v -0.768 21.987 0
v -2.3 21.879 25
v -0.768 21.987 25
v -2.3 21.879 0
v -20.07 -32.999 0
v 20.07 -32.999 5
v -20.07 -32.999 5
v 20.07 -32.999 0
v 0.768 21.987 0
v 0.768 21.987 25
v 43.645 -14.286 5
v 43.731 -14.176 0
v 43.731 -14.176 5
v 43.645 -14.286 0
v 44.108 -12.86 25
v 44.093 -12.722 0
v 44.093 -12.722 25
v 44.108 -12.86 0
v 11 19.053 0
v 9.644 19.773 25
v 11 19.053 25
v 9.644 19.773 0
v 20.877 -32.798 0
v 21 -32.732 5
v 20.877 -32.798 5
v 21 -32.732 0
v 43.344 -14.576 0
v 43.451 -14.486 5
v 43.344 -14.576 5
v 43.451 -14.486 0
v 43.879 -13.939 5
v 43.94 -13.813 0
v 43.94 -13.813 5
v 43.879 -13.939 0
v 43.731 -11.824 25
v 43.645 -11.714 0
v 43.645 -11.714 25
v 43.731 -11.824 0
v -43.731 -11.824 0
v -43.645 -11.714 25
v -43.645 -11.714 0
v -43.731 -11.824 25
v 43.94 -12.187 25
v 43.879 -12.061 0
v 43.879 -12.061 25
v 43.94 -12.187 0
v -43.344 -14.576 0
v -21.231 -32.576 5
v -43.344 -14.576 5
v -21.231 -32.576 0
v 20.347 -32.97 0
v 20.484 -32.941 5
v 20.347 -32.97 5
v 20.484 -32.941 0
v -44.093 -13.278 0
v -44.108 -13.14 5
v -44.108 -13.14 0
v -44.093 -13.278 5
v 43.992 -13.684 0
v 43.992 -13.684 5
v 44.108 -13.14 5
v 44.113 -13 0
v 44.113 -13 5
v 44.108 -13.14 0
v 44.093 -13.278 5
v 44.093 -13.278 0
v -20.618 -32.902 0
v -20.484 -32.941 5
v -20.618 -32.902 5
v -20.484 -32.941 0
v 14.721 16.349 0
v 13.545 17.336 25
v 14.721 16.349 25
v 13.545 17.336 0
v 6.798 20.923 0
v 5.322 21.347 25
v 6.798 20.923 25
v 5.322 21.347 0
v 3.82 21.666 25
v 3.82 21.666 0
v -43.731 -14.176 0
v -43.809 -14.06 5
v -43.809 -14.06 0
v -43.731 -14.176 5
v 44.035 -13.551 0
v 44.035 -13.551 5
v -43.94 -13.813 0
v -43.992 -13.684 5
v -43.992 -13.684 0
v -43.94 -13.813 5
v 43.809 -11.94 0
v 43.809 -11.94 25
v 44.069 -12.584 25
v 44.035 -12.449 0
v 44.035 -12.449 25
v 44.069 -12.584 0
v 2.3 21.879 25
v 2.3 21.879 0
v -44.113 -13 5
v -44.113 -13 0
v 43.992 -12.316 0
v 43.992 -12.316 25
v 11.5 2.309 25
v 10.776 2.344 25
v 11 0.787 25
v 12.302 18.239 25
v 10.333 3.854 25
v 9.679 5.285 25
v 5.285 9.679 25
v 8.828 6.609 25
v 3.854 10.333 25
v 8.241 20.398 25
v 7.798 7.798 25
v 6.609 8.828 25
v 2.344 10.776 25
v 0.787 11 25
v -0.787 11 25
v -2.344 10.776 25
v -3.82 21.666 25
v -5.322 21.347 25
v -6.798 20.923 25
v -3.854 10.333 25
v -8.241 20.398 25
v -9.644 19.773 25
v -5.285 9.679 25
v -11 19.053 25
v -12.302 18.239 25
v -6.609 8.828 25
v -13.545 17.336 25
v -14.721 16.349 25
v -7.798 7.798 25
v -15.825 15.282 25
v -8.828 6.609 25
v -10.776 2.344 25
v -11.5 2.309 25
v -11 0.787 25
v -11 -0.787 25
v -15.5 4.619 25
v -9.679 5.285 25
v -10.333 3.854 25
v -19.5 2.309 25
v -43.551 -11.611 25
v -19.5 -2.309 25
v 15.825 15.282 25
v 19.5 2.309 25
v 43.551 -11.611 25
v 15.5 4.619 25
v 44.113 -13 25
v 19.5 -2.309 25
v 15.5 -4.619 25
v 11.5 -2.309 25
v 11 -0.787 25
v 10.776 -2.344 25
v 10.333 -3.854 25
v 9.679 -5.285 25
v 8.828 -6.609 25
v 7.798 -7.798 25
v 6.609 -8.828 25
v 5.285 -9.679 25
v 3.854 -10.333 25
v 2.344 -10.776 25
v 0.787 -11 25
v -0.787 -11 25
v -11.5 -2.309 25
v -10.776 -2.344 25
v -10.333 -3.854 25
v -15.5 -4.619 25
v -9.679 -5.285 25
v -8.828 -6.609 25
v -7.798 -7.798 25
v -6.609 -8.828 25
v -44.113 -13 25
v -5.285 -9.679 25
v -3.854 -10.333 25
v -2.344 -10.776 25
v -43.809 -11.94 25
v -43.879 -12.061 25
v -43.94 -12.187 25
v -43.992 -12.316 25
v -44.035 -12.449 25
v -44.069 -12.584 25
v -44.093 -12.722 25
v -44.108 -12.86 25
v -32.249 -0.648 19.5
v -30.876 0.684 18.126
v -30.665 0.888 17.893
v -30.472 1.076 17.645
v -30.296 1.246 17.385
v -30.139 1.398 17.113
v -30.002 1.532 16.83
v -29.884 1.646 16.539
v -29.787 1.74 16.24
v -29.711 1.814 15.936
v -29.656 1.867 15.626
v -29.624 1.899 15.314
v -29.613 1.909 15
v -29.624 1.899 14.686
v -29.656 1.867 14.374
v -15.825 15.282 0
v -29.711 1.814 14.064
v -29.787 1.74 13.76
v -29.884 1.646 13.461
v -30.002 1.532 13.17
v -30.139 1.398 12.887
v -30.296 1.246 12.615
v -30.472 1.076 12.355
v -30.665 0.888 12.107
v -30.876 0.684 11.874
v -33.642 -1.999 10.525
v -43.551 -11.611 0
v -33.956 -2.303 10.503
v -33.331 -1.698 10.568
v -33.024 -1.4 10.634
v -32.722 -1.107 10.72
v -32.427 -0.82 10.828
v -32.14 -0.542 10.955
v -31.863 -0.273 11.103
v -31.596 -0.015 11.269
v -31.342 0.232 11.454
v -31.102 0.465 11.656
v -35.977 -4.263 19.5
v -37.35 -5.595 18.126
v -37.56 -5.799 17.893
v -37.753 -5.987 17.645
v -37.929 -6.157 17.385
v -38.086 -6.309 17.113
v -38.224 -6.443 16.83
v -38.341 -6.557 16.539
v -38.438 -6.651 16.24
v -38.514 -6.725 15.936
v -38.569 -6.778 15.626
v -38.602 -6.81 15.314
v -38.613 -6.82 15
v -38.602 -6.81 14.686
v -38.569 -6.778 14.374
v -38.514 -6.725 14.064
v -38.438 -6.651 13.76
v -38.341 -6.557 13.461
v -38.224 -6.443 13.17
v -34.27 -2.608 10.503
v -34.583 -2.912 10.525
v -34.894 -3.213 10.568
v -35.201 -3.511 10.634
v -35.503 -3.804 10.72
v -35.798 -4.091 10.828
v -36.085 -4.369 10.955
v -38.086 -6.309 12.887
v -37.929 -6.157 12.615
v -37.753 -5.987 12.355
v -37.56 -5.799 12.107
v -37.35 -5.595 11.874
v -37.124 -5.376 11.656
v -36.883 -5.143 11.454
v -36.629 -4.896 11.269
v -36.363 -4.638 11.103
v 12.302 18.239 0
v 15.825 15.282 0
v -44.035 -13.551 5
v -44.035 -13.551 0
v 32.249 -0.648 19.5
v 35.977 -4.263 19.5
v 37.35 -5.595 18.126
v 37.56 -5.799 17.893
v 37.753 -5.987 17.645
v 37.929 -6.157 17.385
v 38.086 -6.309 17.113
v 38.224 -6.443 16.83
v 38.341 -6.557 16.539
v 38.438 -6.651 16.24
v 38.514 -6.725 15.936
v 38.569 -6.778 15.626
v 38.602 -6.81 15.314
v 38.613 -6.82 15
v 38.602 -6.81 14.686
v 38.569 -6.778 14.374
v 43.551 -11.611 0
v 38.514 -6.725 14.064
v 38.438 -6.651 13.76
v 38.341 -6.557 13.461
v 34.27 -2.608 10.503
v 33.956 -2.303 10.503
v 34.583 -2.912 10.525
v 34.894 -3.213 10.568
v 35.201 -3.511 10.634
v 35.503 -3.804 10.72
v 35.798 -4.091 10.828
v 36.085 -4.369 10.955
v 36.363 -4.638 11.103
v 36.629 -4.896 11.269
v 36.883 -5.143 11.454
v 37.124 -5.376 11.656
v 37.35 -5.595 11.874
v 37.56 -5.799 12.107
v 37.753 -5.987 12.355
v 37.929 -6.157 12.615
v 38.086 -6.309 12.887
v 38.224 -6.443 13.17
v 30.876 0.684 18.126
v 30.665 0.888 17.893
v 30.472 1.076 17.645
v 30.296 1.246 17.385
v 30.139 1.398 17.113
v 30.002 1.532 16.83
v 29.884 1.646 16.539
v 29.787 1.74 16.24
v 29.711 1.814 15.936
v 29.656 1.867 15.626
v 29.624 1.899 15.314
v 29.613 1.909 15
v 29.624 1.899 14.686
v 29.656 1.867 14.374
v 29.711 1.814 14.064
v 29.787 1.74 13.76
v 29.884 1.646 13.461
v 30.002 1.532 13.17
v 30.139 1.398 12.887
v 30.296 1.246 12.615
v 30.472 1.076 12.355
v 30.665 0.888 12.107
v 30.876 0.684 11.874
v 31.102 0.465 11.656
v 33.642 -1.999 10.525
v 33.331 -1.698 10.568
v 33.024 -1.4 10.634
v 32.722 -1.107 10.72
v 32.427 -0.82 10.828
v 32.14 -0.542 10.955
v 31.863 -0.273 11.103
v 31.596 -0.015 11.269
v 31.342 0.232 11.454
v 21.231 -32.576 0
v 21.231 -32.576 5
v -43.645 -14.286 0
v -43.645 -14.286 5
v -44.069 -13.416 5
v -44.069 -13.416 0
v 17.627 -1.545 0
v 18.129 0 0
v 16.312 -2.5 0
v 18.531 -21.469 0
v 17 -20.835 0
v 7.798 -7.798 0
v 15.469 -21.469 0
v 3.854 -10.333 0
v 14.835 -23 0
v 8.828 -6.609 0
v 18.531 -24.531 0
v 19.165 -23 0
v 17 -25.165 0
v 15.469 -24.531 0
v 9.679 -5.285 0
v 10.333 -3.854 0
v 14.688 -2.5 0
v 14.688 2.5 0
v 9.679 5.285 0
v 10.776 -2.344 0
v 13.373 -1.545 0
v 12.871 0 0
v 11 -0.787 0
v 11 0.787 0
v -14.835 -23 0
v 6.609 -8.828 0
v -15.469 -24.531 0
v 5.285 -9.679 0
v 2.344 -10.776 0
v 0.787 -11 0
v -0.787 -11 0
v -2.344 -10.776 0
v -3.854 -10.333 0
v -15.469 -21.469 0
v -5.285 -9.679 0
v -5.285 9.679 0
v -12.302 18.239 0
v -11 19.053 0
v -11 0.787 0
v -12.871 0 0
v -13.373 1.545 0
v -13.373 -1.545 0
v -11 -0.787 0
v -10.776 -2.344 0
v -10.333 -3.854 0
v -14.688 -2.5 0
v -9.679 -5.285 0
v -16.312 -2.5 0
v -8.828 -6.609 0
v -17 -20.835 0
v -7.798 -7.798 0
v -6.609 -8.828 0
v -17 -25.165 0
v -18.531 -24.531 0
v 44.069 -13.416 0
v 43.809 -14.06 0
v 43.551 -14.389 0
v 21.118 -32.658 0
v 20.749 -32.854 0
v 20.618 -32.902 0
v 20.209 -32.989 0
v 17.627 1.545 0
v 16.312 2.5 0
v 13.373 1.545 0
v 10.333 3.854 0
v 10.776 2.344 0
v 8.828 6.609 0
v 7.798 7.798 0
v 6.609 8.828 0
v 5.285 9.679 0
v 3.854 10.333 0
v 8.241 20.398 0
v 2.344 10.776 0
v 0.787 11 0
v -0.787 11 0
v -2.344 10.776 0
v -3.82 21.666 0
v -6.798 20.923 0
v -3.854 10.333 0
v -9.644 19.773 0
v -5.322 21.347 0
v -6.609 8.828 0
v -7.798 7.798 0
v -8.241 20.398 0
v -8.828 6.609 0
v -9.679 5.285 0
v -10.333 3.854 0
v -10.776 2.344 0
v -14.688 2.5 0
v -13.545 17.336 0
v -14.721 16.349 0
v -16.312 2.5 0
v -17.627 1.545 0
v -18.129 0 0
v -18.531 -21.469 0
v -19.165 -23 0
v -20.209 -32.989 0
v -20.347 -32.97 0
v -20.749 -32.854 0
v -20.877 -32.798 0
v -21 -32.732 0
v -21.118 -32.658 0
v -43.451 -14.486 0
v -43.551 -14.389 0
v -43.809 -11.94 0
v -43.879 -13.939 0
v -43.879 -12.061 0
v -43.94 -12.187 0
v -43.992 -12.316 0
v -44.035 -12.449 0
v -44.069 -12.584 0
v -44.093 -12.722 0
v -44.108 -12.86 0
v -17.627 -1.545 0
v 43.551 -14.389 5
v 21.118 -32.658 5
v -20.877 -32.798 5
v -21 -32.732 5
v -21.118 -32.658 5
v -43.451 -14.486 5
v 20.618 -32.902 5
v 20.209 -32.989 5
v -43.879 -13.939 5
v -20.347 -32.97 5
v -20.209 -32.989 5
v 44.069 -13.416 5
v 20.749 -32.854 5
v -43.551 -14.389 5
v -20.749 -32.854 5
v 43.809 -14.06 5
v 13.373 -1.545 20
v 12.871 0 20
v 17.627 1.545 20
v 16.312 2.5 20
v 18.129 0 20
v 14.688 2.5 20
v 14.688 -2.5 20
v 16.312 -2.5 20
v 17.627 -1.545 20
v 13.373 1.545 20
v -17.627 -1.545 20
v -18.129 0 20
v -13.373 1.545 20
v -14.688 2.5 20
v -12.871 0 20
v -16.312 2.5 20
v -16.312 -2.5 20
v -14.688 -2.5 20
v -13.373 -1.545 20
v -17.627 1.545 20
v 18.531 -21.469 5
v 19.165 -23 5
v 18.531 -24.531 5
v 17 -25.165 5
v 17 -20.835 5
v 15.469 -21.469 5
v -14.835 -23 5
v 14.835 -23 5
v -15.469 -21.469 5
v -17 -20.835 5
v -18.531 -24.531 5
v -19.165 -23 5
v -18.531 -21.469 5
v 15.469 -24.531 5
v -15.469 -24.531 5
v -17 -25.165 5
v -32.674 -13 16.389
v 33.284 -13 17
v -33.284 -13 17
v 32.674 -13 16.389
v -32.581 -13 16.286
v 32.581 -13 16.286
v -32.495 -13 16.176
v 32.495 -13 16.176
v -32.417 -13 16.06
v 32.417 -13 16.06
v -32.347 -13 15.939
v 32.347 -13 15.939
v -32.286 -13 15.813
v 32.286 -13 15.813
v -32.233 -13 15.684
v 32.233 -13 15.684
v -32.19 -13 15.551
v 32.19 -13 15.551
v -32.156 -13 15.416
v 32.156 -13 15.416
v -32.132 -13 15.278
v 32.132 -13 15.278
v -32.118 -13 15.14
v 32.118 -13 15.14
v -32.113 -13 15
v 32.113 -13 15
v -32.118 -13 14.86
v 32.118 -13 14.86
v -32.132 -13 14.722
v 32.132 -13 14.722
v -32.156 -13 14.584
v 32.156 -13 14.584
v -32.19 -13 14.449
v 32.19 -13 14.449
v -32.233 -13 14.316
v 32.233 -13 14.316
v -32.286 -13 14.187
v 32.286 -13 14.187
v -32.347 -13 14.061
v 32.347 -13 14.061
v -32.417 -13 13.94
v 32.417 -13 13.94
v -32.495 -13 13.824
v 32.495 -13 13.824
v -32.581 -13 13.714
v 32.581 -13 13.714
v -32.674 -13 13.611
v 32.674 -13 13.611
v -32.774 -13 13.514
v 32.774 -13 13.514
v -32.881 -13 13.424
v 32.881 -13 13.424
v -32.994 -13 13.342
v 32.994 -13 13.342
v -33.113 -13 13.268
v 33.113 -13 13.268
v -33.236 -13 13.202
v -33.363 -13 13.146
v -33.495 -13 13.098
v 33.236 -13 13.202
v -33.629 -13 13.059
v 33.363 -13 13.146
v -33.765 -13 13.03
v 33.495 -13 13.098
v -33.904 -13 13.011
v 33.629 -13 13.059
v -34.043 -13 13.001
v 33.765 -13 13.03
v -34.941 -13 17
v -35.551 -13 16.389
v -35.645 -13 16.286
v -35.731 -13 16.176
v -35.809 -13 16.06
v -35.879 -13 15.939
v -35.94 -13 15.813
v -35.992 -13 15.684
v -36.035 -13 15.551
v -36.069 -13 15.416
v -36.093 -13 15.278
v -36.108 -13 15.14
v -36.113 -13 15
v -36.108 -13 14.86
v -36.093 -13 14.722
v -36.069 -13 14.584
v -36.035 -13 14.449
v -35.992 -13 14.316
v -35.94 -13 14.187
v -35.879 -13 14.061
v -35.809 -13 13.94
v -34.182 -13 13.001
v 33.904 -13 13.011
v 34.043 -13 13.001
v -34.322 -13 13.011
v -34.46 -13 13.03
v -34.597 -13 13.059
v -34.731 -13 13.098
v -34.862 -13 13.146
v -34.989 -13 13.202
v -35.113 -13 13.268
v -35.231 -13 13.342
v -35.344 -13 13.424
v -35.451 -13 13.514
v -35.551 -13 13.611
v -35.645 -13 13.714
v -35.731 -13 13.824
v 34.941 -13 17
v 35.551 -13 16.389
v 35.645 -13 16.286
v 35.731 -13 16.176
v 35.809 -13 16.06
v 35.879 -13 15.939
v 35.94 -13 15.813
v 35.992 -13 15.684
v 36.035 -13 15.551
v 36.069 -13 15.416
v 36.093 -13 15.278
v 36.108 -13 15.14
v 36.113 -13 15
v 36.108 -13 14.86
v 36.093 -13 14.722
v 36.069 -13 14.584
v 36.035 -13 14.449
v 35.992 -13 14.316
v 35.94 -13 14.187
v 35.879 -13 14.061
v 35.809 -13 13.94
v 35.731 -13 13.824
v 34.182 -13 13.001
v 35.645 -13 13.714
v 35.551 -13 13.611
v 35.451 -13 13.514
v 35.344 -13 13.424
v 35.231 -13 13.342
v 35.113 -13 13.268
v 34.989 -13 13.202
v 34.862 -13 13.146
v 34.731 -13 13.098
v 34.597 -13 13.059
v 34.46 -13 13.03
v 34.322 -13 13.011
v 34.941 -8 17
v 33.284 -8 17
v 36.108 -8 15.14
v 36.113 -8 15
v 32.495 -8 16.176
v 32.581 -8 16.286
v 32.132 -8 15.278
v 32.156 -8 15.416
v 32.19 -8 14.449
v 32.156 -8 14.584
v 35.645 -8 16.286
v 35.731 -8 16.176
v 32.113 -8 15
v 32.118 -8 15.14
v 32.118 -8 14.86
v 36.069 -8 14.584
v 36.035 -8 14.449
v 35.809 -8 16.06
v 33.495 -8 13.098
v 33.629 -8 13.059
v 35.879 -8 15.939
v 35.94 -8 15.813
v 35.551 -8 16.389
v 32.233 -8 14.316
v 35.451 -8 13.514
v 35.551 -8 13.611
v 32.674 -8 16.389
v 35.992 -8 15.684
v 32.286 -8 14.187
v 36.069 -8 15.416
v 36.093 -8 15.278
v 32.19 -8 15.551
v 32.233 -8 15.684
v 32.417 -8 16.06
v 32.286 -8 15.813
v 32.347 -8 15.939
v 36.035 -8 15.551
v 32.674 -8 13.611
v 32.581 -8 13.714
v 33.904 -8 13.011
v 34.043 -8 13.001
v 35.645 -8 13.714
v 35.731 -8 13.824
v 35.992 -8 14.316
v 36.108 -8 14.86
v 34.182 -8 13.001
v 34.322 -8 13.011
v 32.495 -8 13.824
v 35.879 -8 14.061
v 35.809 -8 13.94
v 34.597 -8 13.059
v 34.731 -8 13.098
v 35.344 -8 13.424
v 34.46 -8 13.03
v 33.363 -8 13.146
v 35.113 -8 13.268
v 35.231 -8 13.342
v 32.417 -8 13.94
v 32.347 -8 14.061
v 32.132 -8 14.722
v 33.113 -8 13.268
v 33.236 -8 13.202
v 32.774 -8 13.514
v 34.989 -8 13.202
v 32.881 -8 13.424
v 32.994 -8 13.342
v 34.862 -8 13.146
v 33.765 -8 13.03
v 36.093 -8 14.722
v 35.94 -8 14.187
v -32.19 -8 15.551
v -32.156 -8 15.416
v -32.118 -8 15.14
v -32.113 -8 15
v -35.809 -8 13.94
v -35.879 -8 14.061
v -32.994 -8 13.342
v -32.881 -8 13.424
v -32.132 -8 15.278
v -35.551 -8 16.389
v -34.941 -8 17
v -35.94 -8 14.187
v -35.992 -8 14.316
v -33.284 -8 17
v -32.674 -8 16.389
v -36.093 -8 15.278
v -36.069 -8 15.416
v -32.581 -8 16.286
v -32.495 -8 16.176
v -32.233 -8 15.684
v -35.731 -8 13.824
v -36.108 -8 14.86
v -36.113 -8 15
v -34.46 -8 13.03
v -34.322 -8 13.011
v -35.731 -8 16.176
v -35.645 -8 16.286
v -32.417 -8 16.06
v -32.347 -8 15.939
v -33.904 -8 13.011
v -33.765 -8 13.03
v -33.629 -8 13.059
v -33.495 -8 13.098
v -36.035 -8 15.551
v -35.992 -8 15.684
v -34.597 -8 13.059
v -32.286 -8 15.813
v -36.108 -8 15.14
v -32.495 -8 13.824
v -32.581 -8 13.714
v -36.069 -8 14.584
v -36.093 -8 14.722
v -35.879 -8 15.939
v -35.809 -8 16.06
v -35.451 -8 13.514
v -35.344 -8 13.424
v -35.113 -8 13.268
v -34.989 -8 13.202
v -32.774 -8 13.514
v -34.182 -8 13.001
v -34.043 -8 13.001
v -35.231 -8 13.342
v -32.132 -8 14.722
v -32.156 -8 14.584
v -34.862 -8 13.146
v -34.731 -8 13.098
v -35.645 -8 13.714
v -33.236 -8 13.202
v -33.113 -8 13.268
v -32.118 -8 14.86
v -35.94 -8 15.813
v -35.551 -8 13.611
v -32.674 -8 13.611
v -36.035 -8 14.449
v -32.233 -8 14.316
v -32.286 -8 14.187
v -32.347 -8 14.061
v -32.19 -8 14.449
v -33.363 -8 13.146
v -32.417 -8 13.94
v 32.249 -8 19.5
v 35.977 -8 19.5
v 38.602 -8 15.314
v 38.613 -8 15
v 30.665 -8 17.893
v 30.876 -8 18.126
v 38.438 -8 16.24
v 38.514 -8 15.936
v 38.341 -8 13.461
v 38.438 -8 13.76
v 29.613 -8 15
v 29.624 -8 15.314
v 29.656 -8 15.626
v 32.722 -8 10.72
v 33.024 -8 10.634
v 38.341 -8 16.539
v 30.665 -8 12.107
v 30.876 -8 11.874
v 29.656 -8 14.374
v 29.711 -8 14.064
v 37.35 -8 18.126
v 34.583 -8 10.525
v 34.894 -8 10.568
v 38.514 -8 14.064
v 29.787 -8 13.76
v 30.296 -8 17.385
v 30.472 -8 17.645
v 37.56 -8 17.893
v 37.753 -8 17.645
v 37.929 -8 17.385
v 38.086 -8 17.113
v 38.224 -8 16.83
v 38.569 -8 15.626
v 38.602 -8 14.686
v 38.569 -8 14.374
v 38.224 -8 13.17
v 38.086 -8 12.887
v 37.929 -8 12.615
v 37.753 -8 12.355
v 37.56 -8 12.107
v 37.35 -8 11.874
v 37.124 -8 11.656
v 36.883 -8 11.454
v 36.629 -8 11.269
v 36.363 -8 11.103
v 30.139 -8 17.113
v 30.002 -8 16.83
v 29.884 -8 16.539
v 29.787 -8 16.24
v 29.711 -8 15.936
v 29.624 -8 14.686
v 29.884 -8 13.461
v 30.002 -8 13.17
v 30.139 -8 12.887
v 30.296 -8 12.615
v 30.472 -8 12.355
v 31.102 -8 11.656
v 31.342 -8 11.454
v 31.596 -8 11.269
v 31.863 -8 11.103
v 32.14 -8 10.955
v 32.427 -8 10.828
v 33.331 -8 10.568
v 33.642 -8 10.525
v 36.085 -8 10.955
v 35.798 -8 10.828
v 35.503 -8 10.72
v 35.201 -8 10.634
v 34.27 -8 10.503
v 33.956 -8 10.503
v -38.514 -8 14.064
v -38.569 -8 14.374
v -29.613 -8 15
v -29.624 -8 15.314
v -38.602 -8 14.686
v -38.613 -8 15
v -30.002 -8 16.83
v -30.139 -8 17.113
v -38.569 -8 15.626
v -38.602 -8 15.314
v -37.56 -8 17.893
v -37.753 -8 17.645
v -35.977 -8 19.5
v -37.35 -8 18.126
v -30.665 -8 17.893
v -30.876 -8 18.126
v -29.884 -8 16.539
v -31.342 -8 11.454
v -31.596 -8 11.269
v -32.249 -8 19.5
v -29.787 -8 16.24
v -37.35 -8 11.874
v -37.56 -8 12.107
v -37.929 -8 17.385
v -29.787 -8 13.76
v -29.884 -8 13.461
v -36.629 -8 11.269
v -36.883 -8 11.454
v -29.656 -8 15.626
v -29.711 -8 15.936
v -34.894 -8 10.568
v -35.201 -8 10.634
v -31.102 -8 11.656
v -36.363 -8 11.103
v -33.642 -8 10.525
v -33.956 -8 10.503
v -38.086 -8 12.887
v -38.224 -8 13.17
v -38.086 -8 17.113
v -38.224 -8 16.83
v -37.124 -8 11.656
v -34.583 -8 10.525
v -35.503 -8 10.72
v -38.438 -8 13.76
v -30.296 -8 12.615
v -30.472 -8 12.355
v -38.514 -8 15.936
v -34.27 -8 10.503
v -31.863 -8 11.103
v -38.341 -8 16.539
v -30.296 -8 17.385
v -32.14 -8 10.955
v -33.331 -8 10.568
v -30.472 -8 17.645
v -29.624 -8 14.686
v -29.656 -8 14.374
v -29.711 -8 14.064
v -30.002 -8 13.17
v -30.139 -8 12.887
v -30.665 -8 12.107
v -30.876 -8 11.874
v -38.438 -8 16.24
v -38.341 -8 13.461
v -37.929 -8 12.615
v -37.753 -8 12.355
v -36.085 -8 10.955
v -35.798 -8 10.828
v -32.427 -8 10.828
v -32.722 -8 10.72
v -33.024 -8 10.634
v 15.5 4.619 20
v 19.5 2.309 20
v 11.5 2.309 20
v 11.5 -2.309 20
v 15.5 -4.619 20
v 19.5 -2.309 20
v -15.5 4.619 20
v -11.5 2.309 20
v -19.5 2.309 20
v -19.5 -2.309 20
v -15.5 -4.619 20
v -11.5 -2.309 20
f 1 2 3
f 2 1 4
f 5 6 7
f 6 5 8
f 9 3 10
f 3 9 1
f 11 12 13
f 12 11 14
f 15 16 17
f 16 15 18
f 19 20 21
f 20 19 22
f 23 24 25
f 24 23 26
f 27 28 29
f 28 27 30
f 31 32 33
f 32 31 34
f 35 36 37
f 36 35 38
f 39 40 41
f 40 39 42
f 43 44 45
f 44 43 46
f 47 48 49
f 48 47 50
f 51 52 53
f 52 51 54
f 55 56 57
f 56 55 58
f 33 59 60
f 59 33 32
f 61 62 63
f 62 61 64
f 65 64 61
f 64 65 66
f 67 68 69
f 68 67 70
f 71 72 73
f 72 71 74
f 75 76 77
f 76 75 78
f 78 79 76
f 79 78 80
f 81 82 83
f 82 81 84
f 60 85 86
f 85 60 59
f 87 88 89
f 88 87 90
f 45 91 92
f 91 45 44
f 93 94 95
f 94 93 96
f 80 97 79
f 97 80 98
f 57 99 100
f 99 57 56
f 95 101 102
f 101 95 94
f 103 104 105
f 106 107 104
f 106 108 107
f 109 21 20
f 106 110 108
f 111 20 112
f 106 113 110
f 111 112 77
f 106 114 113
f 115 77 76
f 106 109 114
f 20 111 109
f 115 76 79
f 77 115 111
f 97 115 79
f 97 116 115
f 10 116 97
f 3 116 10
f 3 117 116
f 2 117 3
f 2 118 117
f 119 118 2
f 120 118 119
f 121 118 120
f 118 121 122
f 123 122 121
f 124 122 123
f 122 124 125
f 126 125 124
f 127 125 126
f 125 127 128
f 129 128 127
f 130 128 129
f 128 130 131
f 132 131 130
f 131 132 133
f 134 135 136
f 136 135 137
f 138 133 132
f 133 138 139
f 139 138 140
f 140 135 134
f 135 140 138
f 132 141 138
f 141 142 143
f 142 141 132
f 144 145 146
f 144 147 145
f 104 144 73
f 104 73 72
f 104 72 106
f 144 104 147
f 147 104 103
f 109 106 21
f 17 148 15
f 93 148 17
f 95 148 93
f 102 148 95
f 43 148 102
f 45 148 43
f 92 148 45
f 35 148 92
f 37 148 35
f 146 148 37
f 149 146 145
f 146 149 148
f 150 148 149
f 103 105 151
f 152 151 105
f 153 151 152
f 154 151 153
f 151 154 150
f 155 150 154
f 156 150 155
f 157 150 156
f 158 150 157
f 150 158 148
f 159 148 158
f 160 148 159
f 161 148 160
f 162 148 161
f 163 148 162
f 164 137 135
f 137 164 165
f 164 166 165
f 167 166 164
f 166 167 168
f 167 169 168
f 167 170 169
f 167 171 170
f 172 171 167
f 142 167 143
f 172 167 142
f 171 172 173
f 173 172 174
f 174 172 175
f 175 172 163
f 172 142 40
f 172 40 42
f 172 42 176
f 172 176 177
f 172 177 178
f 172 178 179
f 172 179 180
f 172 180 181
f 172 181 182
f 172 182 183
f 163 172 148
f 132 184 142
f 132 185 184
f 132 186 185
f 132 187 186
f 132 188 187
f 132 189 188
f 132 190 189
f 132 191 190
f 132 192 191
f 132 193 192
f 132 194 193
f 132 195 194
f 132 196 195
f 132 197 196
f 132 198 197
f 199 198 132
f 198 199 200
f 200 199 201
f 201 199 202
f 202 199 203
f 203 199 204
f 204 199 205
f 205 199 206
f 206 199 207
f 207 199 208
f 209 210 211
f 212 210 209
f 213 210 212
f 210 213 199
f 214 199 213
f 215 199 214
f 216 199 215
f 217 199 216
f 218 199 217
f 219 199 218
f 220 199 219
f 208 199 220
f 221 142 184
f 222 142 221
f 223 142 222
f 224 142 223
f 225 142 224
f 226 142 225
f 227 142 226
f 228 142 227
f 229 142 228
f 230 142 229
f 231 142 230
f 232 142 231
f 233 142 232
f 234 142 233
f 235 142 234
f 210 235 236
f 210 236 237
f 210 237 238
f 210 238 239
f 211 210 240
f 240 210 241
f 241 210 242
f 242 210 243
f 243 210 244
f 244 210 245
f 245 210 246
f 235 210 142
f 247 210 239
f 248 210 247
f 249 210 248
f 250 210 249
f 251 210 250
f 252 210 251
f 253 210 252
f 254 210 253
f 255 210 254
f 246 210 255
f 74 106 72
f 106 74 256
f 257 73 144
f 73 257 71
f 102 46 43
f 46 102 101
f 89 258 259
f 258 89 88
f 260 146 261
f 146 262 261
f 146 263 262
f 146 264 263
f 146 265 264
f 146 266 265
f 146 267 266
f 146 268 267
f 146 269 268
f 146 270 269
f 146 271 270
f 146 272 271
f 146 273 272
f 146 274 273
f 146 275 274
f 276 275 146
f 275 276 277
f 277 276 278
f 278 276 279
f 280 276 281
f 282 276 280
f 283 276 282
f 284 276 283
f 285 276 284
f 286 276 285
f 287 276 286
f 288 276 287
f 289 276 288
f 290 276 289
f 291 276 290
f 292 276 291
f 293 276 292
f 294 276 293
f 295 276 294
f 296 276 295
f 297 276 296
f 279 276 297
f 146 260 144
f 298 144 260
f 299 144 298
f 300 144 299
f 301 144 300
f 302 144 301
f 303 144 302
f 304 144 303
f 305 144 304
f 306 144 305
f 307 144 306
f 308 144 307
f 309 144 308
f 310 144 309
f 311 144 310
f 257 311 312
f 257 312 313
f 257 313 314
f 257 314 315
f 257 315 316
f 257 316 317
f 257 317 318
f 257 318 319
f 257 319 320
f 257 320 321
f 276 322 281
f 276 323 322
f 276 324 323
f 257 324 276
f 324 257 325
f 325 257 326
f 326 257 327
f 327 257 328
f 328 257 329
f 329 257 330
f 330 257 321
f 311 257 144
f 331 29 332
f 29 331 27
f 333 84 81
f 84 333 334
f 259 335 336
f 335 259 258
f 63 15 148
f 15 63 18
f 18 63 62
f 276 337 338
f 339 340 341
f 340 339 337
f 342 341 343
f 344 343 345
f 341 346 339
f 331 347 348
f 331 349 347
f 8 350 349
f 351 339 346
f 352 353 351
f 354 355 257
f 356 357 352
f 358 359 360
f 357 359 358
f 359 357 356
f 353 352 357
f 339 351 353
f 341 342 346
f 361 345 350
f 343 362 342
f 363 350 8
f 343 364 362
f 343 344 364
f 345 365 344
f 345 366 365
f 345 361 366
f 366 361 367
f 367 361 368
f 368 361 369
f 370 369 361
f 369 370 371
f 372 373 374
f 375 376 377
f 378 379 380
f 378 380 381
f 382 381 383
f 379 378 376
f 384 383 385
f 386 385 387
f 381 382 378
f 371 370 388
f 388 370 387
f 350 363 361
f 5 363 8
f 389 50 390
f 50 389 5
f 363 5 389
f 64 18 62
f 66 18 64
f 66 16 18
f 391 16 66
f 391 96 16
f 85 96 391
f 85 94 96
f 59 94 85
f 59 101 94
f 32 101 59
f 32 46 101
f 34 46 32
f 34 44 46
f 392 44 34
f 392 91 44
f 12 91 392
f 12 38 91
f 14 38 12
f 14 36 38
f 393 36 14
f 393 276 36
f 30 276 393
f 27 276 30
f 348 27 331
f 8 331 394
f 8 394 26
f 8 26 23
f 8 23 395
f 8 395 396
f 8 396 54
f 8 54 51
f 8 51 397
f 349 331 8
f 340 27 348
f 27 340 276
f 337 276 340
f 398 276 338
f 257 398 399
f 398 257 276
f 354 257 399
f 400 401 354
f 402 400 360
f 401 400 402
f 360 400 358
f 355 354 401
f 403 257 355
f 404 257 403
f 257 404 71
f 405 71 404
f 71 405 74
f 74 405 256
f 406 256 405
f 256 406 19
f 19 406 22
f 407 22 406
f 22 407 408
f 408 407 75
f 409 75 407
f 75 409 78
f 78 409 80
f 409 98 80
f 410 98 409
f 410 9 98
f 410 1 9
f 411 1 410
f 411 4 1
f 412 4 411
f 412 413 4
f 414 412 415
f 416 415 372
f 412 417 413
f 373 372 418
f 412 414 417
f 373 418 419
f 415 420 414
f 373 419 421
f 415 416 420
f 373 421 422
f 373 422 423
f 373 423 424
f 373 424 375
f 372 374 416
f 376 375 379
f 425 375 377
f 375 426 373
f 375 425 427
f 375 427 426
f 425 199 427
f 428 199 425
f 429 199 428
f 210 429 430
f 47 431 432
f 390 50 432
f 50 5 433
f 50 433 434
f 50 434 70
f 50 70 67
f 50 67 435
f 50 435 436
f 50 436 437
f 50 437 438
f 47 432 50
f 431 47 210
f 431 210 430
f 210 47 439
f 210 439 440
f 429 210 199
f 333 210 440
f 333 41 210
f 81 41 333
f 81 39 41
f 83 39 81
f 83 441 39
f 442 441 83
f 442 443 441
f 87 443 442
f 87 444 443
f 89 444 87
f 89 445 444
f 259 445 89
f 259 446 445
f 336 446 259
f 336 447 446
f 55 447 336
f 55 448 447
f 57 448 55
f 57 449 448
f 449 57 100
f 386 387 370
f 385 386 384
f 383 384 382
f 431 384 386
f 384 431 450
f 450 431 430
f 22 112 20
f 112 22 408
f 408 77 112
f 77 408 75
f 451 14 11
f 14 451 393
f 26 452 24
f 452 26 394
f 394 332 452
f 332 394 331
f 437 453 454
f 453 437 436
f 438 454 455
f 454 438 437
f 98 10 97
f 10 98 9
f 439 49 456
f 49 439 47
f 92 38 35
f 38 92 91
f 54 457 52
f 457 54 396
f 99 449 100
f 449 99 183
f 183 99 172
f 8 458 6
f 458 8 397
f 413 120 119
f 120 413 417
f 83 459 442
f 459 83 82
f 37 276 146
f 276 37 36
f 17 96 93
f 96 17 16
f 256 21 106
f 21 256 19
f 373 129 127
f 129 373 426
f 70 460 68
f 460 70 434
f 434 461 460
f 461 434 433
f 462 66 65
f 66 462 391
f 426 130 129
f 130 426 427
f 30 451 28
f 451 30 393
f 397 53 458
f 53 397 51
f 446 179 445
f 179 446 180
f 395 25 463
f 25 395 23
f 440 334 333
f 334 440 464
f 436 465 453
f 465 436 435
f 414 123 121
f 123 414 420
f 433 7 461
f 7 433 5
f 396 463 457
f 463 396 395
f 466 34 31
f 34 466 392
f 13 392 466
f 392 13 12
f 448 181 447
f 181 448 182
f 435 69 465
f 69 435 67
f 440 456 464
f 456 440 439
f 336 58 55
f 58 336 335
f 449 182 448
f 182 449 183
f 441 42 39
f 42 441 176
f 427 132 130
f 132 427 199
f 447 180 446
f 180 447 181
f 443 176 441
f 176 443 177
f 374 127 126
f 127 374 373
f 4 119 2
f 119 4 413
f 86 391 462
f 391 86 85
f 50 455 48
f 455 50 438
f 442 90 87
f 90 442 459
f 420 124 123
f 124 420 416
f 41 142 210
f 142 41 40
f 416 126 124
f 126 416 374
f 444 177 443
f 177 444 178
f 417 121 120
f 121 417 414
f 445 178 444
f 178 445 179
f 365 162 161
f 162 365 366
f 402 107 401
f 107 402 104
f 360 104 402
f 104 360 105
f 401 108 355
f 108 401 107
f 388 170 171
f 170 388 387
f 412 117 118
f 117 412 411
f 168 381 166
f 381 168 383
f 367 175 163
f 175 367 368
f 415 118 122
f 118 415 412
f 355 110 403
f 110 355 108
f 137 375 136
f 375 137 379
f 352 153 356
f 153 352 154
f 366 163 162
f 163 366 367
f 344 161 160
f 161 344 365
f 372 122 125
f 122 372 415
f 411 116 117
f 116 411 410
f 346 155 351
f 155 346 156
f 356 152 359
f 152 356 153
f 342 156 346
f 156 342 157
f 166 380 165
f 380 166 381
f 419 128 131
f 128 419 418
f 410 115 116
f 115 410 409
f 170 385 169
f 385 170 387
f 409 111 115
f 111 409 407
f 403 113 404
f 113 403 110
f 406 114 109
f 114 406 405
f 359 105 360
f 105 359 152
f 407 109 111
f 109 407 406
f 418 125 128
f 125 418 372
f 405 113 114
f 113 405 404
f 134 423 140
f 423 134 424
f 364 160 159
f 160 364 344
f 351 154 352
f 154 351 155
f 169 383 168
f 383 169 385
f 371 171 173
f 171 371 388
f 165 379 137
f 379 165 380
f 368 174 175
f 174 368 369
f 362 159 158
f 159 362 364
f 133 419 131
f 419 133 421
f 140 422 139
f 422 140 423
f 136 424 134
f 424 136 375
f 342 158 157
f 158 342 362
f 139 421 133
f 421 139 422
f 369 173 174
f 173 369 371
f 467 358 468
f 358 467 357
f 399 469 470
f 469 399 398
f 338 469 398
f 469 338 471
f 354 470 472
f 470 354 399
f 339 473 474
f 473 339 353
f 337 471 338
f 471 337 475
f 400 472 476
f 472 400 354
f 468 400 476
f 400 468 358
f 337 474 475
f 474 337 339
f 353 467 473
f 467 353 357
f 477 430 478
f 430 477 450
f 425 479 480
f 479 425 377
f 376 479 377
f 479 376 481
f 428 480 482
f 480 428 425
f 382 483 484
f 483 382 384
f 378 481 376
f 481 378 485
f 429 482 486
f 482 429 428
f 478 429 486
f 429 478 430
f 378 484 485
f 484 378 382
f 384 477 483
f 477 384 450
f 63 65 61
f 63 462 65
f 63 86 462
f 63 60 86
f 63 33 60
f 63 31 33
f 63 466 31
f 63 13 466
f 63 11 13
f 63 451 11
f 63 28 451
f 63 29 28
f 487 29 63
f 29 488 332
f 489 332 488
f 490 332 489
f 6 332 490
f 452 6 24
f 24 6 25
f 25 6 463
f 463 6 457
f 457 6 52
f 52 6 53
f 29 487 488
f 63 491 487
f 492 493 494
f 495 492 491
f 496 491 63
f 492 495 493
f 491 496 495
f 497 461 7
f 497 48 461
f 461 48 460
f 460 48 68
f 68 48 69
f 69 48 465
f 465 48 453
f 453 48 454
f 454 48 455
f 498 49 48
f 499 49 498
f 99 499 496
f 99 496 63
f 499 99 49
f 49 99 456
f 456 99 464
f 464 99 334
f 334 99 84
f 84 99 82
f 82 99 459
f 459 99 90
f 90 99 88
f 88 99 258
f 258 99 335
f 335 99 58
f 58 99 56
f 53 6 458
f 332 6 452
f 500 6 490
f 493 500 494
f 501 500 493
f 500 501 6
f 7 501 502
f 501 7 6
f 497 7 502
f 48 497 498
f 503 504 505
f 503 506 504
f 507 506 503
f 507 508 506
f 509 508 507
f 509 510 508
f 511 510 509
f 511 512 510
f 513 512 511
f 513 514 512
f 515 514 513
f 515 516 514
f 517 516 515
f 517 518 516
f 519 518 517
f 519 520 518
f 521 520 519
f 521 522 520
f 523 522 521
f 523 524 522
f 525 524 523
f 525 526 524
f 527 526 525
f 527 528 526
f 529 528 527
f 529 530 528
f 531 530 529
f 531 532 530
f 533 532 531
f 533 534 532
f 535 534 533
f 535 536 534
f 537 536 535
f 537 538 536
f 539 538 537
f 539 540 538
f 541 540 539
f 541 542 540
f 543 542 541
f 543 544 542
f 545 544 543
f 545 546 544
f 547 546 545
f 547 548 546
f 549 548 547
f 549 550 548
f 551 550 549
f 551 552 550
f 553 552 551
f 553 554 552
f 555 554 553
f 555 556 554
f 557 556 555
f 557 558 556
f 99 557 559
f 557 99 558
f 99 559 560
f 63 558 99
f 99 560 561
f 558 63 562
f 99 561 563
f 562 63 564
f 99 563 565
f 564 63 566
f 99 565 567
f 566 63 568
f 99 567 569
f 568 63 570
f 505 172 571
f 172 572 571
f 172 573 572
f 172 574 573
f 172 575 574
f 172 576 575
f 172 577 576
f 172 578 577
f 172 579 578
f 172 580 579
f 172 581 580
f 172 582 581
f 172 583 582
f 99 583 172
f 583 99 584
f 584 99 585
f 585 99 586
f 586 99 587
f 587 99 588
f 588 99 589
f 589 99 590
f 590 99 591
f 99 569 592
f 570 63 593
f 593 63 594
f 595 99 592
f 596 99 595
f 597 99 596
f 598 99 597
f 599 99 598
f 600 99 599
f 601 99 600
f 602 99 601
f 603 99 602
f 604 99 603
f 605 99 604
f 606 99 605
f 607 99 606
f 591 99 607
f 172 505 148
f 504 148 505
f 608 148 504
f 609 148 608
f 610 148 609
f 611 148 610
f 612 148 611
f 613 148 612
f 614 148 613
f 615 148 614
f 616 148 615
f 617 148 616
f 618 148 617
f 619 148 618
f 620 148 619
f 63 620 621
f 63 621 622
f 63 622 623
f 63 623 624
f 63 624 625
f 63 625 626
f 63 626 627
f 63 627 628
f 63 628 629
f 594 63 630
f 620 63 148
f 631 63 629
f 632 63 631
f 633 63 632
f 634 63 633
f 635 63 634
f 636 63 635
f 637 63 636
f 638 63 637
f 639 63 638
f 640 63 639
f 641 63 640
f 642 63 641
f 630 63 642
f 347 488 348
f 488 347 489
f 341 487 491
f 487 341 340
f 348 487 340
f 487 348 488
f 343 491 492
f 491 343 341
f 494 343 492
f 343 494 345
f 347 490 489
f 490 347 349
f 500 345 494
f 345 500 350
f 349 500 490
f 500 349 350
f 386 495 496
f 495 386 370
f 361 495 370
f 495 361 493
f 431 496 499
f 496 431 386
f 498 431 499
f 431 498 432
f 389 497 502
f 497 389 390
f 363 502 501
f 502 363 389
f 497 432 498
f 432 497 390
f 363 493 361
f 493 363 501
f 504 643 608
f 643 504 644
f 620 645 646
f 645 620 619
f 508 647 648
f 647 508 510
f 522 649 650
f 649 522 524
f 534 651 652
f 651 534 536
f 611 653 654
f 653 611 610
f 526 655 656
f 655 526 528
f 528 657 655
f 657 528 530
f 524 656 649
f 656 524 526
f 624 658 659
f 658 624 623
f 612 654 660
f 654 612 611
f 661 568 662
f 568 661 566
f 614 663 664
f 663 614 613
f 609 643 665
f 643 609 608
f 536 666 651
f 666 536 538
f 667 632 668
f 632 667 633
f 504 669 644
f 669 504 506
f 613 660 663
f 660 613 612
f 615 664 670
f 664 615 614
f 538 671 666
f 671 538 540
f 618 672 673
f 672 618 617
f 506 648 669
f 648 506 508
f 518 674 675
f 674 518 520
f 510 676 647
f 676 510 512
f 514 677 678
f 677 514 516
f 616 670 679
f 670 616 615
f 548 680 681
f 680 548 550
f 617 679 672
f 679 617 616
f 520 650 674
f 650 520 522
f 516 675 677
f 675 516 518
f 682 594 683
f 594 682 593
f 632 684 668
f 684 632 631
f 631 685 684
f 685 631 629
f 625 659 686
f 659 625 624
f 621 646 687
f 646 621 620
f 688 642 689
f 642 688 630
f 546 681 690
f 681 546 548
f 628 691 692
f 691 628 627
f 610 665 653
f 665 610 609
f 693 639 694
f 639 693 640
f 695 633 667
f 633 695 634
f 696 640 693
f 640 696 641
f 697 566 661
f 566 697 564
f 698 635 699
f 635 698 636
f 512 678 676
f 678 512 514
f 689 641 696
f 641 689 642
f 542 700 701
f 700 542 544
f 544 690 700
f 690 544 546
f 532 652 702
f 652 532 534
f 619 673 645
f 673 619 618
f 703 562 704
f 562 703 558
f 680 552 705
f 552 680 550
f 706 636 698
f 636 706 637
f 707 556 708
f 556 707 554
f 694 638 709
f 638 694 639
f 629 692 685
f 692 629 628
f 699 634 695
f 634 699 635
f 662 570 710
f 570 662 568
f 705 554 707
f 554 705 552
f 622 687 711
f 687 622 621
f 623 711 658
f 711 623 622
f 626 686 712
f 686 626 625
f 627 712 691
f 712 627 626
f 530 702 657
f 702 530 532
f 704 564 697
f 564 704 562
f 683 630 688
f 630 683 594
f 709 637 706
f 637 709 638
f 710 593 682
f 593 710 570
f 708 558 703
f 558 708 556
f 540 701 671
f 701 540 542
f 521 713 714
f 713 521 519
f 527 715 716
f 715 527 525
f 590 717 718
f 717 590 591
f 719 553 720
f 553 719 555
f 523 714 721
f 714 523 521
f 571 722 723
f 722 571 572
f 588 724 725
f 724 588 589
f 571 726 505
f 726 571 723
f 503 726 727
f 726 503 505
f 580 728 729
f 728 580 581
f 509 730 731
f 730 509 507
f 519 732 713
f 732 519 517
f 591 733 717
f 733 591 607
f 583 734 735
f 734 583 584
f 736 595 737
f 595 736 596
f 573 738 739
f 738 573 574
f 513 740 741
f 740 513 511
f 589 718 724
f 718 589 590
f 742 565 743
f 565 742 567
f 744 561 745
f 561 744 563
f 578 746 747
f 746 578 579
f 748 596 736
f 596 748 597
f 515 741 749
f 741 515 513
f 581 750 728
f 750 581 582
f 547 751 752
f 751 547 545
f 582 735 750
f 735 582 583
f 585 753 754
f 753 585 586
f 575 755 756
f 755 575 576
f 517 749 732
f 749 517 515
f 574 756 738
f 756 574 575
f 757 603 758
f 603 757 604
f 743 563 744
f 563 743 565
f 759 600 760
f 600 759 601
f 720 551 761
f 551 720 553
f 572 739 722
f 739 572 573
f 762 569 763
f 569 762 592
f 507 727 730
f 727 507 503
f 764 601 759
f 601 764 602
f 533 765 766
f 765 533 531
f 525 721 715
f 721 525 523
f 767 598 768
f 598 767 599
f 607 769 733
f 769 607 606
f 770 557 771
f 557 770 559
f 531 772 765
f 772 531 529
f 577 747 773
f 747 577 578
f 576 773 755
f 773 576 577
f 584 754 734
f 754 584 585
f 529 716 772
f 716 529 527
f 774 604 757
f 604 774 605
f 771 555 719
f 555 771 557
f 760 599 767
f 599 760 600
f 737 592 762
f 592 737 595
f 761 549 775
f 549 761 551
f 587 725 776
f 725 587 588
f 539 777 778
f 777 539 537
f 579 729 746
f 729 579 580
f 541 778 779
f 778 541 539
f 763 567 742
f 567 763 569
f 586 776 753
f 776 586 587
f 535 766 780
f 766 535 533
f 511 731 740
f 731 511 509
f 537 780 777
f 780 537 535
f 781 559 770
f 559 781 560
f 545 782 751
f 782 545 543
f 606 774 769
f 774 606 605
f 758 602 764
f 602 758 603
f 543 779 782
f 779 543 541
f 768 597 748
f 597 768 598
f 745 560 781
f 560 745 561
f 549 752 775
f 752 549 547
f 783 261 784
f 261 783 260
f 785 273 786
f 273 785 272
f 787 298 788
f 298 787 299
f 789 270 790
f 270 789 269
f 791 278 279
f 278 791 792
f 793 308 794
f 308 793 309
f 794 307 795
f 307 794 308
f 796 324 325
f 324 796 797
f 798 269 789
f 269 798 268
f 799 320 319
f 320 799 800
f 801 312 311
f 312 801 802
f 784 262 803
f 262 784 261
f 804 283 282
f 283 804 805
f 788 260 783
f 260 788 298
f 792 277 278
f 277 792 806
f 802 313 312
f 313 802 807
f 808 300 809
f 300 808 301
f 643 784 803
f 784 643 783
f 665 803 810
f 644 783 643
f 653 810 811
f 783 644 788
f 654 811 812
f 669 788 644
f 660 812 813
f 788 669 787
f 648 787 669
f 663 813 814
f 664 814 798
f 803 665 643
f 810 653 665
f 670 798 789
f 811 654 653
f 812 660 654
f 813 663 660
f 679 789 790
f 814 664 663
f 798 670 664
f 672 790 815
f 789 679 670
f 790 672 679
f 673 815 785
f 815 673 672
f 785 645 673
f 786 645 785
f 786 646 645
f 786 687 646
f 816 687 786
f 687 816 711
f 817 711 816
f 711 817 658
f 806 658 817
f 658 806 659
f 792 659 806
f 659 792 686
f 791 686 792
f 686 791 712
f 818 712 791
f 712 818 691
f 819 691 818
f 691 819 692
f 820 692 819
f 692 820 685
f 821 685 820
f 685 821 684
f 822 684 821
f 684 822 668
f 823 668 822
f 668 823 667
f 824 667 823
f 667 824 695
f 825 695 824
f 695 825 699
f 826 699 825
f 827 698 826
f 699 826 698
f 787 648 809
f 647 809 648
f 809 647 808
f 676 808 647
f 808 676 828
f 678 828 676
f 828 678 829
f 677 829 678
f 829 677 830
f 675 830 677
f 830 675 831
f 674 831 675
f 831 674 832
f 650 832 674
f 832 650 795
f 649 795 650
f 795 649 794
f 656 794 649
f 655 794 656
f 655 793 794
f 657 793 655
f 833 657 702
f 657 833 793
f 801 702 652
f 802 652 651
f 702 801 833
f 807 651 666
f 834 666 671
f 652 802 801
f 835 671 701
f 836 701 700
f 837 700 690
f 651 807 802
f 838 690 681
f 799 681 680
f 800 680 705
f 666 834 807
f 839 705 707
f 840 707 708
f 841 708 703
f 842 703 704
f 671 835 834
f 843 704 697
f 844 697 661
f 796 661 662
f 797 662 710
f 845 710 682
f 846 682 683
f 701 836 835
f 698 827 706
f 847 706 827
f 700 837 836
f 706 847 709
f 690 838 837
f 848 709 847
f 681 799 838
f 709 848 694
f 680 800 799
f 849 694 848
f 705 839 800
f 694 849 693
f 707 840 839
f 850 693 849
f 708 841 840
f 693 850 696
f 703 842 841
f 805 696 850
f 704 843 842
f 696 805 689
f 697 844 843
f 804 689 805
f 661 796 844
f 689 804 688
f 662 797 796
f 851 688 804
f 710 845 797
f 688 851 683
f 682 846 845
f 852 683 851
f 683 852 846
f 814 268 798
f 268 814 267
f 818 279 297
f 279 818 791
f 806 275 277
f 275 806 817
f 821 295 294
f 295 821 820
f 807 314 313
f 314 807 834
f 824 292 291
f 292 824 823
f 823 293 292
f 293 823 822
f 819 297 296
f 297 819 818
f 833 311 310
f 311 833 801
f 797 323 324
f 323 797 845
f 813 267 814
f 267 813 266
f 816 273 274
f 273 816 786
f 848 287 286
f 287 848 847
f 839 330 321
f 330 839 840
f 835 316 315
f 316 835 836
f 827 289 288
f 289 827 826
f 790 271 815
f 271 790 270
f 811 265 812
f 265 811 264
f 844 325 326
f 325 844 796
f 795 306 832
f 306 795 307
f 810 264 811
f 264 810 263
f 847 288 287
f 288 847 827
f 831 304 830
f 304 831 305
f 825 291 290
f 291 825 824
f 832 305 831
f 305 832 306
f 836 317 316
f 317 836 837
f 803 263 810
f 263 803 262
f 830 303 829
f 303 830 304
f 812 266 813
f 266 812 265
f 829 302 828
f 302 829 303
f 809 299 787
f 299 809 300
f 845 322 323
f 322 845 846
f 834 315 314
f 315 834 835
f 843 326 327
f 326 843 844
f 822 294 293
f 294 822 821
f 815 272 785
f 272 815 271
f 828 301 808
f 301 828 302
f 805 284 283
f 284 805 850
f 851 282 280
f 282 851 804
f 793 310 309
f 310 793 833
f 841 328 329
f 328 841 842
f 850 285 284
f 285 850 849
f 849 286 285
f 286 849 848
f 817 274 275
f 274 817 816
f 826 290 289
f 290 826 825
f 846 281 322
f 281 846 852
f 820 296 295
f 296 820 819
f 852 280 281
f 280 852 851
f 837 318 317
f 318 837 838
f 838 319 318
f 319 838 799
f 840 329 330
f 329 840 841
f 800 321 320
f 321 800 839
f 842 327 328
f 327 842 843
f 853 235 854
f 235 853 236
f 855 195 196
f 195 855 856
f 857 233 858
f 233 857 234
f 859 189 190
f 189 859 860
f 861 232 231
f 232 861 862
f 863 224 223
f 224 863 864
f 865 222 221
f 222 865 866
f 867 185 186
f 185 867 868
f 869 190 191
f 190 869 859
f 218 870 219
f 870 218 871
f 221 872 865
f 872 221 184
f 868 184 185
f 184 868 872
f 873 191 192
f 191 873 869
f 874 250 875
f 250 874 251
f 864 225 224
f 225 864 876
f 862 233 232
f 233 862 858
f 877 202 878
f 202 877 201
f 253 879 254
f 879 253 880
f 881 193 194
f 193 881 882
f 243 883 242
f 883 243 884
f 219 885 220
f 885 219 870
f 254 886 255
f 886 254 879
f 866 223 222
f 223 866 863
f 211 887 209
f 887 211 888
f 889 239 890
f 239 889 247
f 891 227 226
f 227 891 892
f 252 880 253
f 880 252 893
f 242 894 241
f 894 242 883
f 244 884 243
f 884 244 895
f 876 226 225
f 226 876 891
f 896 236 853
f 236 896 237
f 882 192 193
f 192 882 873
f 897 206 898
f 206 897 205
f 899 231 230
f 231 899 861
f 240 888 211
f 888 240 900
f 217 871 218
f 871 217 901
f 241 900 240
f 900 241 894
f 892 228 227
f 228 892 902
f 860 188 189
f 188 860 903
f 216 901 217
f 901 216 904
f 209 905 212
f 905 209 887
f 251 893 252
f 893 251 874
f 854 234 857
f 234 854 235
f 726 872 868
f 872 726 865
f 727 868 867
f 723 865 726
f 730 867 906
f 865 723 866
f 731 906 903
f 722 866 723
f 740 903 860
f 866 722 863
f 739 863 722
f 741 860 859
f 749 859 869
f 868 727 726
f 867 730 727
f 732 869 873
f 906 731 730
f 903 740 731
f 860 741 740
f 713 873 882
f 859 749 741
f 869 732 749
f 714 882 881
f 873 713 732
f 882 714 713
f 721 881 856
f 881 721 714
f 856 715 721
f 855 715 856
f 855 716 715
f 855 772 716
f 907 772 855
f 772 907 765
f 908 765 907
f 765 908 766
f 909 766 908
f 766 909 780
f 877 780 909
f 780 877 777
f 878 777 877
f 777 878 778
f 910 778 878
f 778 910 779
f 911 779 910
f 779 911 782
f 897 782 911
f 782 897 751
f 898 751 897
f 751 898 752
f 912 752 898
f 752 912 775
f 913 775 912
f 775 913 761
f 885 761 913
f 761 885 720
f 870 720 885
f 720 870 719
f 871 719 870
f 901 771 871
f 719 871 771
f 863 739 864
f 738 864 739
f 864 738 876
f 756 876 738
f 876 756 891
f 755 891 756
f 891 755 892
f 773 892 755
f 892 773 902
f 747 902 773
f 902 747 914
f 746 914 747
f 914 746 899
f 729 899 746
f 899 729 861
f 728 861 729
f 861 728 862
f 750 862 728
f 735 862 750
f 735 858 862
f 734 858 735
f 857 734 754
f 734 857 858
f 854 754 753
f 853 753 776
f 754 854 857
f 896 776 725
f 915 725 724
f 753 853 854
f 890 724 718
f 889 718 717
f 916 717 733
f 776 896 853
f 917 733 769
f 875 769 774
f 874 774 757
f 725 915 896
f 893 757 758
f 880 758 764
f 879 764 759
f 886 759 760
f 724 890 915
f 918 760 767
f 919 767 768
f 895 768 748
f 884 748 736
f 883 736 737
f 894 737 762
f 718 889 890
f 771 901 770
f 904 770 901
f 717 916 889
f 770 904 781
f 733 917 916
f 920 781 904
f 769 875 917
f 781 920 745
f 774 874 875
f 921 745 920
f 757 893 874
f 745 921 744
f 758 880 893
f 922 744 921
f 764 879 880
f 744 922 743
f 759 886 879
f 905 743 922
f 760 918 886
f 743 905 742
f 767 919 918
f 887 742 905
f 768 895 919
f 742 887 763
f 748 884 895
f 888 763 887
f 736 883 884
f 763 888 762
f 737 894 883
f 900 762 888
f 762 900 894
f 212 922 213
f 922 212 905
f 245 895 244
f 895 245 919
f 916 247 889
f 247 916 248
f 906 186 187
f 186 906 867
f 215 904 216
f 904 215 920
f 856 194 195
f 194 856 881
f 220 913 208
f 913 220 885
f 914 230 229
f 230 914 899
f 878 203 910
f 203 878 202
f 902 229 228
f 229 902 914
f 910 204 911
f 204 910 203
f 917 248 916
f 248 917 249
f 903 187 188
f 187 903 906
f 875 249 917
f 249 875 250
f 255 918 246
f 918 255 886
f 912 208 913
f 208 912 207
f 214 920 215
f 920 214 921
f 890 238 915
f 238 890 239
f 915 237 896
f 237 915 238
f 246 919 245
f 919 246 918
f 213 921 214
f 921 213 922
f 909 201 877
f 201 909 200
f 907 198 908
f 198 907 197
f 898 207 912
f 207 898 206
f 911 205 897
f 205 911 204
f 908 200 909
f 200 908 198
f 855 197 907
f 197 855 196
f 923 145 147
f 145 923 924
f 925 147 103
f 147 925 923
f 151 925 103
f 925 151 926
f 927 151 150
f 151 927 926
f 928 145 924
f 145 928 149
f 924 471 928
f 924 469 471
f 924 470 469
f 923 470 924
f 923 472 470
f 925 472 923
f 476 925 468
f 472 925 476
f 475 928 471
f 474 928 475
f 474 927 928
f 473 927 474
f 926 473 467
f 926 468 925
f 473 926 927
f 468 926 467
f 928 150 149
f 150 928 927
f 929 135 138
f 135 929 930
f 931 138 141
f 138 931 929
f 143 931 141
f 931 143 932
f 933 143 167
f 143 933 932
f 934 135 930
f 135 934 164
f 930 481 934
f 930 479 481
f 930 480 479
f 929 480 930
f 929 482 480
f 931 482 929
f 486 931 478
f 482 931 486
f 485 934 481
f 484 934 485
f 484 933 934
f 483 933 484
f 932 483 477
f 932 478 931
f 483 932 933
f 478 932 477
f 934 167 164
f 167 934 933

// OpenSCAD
// file: nutShape.scad
// a nut shape that takes height and width across flats as input.

nutShape(6, 3);

module nutShape(w, h)
{
    rotate_extrude($fn = 6)
        square([((w / 2) / (cos(30))), h], center = false);
}
// file: trunctear.scad
//A module for truncated tear drops.

trunctear(1, 0.5, $fn = 90);

module trunctear(hei, radian, cent = false)
{
    linear_extrude(height = hei, center = cent)
        hull()
        {
            circle(r = radian);
            translate([0, radian/2])
                square([2*(radian*(2*cos(45)-1)), radian], center = true);
        }
}
// file: polyhole.scad
// The Cylinder is dead! Long live the Cylinder!
// A module for a polyhole by radius, based on Nophead's work.

module polyhole(h, r, cent = false)
{
    n = max(round(4 * r), 3);
    cylinder(h = h, r = r / cos(180 / n), $fn = n, center = cent);
}
// main file
// used to mount the lead screw nut

use<polyhole.scad>
use<trunctear.scad>
use<nutShape.scad>

NutMount();

module NutMount()
{
    difference()
    {
        union()
        {
            hull()
            {
                cylinder(h = 25, r = 22, $fn = 90);
                translate([(22*sqrt(2)+13)-2, -11-2, 0])
                    cylinder(h = 25, r = 2, $fn = 90);
                translate([-(22*sqrt(2)+13)+2, -11-2, 0])
                    cylinder(h = 25, r = 2, $fn = 90);
                translate([22-2, -20-11, 0])
                    cylinder(h = 25, r = 2, $fn = 90);
                translate([-22+2, -20-11, 0])
                    cylinder(h = 25, r = 2, $fn = 90);
            }
        }
        rotate([0, 0, 45/11])
            polyhole(25, 11);
        translate([31/2, 0, 0])
            polyhole(25, 2.5);
        translate([-31/2, 0, 0])
            polyhole(25, 2.5);
        translate([0, -10-11-2, 10+5])
            cube([2*(22*sqrt(2)+13), 20, 20], center = true);
        translate([22-5, -10-11-2, 0])
            polyhole(5, 2);
        translate([-22+5, -10-11-2, 0])
            polyhole(5, 2);
        translate([(22*sqrt(2)+13-10), -11-2, 15])
            rotate([90, 0, 180])
                trunctear(44, 2, $fn = 90);
        translate([-(22*sqrt(2)+13-10), -11-2, 15])
            rotate([90, 0, 180])
                trunctear(44, 2, $fn = 90);
        translate([(22*sqrt(2)+13-10), -11-2+5, 15])
            rotate([90, 0, 180])
                trunctear(44, 9/2, $fn = 90);
        translate([-(22*sqrt(2)+13-10), -11-2+5, 15])
            rotate([90, 0, 180])
                trunctear(44, 9/2, $fn = 90);
        translate([31/2, 0, 20])
            rotate([0, 0, 30])
                nutShape(8, 5);
        translate([-31/2, 0, 20])
            rotate([0, 0, 30])
                nutShape(8, 5);
    }
}
